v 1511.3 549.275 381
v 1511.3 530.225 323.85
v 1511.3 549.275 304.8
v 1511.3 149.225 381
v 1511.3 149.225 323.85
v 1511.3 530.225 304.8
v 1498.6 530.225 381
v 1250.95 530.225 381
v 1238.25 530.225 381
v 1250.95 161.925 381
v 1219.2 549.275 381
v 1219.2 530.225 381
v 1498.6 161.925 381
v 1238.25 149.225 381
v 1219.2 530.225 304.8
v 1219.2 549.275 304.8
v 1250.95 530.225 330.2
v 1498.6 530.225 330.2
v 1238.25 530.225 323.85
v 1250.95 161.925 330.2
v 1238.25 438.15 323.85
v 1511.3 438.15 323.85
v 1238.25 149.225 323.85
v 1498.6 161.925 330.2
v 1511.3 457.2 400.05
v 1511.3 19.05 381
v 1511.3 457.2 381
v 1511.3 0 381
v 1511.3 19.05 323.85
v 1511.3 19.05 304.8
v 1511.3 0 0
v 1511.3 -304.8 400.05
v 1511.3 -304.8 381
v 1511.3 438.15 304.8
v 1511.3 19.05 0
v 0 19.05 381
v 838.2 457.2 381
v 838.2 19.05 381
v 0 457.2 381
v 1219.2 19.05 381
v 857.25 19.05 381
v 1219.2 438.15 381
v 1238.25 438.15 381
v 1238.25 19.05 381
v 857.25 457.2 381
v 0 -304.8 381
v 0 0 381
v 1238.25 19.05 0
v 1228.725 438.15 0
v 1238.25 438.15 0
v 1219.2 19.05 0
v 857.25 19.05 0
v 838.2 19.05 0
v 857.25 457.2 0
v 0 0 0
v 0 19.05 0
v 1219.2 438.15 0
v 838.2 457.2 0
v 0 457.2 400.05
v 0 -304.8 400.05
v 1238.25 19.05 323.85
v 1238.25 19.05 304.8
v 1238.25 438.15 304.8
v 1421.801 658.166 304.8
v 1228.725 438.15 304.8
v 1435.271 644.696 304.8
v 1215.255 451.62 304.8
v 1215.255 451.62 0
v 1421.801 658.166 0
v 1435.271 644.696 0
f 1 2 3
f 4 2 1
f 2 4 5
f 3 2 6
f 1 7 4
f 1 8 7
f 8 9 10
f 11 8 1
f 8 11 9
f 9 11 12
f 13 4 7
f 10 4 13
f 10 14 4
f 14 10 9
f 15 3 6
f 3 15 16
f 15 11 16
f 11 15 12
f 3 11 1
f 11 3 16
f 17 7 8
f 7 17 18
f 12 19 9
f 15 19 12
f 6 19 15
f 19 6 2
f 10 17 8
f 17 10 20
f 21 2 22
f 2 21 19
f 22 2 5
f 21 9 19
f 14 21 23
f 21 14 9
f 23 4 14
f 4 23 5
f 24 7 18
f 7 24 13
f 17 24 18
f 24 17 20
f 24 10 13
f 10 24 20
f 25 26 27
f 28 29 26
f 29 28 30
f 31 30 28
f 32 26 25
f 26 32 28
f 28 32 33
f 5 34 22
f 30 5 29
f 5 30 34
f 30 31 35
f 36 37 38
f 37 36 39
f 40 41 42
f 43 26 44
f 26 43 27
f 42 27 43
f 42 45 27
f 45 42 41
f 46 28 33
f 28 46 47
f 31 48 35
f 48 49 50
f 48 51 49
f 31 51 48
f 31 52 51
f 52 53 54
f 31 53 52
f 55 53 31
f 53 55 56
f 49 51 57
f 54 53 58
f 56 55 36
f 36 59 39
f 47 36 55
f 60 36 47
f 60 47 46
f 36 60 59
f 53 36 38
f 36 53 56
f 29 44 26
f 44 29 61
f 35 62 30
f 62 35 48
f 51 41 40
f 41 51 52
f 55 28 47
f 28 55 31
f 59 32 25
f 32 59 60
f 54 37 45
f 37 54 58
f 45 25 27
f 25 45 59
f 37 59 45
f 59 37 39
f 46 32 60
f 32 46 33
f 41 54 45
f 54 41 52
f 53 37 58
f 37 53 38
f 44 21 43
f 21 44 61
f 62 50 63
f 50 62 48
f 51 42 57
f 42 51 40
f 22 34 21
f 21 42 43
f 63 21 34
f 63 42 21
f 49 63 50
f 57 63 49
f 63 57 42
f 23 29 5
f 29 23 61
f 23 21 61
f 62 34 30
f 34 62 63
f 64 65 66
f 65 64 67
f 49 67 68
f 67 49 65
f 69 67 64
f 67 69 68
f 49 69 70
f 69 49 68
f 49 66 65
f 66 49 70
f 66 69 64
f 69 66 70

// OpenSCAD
// file: silverware_drawer.scad
use <../lib/convert.scad>

module silverware_drawer(open = 0) {
  translate([0, open * inches(14.5), 0])
  union() {
    // front
    color("#ccd")
    cube([inches(11.5), inches(0.75), inches(3)]);

    // right side
    color("#f2ba52")
    translate([inches(0.75), inches(-15), inches(0.75)])
      cube([inches(0.5), inches(15), inches(2.25)]);

    // left side
    color("#f2ba52")
    translate([inches(11), inches(-15), inches(0.75)])
      cube([inches(0.5), inches(15), inches(2.25)]);

    // bottom
    color("#f2ba52")
    translate([inches(1), inches(-15), inches(0.75)])
      cube([inches(10), inches(15), inches(0.25)]);

    // back
    color("#f2ba52")
    translate([inches(0.75), inches(-15), inches(0.75)])
      cube([inches(10.75), inches(0.5), inches(2.25)]);
  }
}
// file: ../lib/convert.scad
function inches(in) = in * 25.4;
function feet(ft) = inches(ft * 12);
// main file
use <../lib/convert.scad>
use <./silverware_drawer.scad>

cabinet_unit_width = feet(4) + inches(11.5);

module counter_top() {
  color("#ccd")
    cube([cabinet_unit_width, feet(2.5), inches(0.75)]);
}

module foot_wall() {
  color("#f2ba52")
    cube([cabinet_unit_width, inches(0.75), inches(15)]);
}

module bottom_cabinet_divider() {
  color("#f2ba52")
    cube([inches(0.75), feet(1.5), inches(15)]);
}

module water_jug_divider() {
  color("#f2ba52")
    cube([inches(0.75), feet(1.5) - inches(0.75), inches(15)]);
}

module electrical_cabinet_top() {
  color("#f2ba52")
    cube([inches(10.75), feet(1.5) - inches(0.75), inches(0.75)]);
}

module electrical_cabinet_door(open = 0) {
  color("#ccd")
  translate([open * inches(0.75), 0, 0])
  rotate([0, 0, open * 90])
    cube([inches(11.5), inches(0.75), inches(12)]);
}

module lower_galley(silverware_open = 0, electrical_open = 0) {
  union() {
    translate([0, 0, 0])
      foot_wall();
    translate([0, feet(-1), inches(15)])
      counter_top();
    translate([0 + feet(2) + inches(9), 0, 0])
      bottom_cabinet_divider();
    translate([0 + feet(4), 0, 0])
      water_jug_divider();
    translate([0 + feet(4) + inches(0.75), 0, inches(12)])
      electrical_cabinet_top();
    translate([0 + feet(4), feet(1.5) - inches(0.75), 0])
      electrical_cabinet_door(electrical_open);
    translate([0 + feet(4), feet(1.5) - inches(0.75), inches(12)])
      silverware_drawer(silverware_open);
  }
}

lower_galley(0.25, 0.5, 1);
